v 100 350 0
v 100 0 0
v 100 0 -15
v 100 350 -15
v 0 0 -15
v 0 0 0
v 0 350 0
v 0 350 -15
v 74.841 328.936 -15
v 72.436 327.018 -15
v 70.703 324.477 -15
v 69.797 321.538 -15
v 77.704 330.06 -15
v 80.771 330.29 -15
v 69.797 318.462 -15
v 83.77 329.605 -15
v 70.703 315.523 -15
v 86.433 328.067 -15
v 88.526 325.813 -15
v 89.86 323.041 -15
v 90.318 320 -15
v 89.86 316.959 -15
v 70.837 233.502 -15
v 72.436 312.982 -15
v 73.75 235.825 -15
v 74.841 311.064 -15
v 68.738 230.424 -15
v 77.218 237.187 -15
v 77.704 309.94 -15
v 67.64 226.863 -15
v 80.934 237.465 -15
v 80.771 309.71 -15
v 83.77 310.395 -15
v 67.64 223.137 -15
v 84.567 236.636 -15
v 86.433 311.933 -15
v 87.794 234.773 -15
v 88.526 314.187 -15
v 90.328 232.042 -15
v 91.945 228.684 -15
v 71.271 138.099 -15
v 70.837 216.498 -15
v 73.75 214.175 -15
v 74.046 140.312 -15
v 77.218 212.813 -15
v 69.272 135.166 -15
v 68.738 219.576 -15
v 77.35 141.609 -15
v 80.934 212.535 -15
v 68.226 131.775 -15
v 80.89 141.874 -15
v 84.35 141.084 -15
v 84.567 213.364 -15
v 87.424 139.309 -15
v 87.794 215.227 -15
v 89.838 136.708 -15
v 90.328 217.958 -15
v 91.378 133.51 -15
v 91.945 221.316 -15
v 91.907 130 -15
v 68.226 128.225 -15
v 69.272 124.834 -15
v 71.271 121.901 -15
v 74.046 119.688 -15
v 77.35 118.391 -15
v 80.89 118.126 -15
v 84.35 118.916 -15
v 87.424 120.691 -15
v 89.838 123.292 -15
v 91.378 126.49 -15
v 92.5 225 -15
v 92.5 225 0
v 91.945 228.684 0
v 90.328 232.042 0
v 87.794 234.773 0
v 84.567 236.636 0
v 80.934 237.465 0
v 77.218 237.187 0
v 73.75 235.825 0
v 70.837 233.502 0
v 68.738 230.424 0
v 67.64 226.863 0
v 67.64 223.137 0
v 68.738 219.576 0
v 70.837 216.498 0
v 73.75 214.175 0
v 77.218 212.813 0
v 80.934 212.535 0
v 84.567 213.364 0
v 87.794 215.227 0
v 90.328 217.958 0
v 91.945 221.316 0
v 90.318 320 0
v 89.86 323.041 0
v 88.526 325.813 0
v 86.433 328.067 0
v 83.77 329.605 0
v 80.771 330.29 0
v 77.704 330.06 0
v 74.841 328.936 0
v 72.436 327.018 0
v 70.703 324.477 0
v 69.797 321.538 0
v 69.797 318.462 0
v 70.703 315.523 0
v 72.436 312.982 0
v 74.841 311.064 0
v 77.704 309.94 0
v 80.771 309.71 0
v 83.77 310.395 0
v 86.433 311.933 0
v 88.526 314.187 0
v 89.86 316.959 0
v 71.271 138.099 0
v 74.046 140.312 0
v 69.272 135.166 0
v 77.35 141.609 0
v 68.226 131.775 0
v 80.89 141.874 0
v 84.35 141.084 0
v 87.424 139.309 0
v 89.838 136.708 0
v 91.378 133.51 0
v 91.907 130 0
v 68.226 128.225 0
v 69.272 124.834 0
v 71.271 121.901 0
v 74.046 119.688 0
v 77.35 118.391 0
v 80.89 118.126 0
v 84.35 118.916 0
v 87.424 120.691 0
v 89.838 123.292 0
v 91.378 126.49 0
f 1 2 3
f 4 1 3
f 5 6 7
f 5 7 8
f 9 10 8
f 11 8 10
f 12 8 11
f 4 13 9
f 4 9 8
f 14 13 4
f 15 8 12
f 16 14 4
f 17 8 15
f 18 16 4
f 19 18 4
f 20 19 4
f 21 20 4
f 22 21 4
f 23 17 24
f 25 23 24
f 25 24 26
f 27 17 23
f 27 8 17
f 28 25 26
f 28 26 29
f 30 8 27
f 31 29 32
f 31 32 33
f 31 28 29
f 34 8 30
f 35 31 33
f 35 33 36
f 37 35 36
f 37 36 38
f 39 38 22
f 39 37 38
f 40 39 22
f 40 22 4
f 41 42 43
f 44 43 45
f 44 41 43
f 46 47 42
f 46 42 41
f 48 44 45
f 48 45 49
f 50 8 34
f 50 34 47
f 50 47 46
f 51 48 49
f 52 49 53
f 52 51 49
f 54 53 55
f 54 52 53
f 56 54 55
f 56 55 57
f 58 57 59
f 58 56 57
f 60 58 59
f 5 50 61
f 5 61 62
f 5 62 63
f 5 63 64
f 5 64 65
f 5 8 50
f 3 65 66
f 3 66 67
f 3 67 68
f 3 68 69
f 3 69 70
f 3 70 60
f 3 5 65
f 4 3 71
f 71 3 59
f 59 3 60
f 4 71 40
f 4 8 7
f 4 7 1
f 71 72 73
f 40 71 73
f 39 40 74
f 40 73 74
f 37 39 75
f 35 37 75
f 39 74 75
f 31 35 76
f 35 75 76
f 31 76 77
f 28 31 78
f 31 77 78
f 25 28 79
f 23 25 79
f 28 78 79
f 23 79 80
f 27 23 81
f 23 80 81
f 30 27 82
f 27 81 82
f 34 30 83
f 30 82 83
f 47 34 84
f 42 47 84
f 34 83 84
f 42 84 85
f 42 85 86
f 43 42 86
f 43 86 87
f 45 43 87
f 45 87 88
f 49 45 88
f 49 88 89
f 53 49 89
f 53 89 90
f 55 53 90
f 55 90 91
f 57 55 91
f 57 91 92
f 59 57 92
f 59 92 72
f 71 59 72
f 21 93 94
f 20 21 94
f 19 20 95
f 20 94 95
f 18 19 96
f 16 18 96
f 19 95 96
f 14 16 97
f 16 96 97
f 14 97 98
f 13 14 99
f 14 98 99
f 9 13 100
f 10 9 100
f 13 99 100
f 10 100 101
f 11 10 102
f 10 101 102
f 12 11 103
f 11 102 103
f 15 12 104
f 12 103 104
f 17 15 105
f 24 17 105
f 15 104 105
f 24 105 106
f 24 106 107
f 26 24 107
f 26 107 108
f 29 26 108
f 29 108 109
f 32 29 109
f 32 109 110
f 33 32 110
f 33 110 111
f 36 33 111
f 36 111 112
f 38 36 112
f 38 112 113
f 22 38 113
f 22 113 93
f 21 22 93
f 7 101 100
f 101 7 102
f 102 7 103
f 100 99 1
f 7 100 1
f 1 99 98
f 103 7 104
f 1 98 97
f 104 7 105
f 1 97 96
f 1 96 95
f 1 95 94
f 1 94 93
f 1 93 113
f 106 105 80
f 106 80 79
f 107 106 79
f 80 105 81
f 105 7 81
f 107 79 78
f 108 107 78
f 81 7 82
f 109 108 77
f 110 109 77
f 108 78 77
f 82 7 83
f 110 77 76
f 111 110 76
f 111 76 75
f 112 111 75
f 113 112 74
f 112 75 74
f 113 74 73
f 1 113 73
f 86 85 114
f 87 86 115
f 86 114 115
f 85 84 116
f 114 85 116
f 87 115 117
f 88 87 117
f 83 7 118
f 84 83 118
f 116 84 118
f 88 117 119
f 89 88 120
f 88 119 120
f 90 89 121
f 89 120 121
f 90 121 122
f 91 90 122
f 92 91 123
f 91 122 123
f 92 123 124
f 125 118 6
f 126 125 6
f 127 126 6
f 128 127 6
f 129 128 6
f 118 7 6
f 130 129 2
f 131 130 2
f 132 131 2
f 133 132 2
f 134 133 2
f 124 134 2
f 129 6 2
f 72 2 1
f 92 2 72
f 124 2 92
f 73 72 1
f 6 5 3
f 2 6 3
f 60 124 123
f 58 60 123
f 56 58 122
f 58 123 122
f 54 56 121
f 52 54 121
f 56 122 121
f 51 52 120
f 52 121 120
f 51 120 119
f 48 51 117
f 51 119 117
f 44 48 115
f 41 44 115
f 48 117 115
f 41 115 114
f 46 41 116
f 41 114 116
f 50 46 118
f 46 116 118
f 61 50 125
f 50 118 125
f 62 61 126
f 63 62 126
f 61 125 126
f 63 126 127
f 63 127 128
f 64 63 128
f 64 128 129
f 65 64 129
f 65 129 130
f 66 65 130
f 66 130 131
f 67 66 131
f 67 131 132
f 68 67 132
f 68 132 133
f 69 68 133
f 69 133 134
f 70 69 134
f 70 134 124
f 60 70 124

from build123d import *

# Parameters (mm, degrees)
SKETCH1_W           = 100
SKETCH1_H           = 15
BOSS_EXTRUDE1_DEPTH = 350
SKETCH2_R           = 12.5
CUT_EXTRUDE1_DEPTH  = 16
SKETCH3_R           = 10.318452201
SKETCH3_R_2         = 11.907148997
CUT_EXTRUDE2_DEPTH  = 16


with BuildPart() as part:
    # Sketch1 → Boss-Extrude1 (new body)
    with BuildSketch(Plane(origin=(0, 0, 0), x_dir=(1, 0, 0), z_dir=(0, 1, 0))):
        with Locations((50, 7.5)):
            Rectangle(SKETCH1_W, SKETCH1_H)
    extrude(amount=BOSS_EXTRUDE1_DEPTH)

    # Sketch2 → Cut-Extrude1 (cut, through all)
    with BuildSketch(Plane.XY):
        with Locations((80, 225)):
            Circle(SKETCH2_R)
    extrude(amount=-CUT_EXTRUDE1_DEPTH, mode=Mode.SUBTRACT)

    # Sketch3 → Cut-Extrude2 (cut, through all)
    with BuildSketch(Plane.XY):
        with Locations((80, 320)):
            Circle(SKETCH3_R)
        with Locations((80, 130)):
            Circle(SKETCH3_R_2)
    extrude(amount=-CUT_EXTRUDE2_DEPTH, mode=Mode.SUBTRACT)


solid = part.part
